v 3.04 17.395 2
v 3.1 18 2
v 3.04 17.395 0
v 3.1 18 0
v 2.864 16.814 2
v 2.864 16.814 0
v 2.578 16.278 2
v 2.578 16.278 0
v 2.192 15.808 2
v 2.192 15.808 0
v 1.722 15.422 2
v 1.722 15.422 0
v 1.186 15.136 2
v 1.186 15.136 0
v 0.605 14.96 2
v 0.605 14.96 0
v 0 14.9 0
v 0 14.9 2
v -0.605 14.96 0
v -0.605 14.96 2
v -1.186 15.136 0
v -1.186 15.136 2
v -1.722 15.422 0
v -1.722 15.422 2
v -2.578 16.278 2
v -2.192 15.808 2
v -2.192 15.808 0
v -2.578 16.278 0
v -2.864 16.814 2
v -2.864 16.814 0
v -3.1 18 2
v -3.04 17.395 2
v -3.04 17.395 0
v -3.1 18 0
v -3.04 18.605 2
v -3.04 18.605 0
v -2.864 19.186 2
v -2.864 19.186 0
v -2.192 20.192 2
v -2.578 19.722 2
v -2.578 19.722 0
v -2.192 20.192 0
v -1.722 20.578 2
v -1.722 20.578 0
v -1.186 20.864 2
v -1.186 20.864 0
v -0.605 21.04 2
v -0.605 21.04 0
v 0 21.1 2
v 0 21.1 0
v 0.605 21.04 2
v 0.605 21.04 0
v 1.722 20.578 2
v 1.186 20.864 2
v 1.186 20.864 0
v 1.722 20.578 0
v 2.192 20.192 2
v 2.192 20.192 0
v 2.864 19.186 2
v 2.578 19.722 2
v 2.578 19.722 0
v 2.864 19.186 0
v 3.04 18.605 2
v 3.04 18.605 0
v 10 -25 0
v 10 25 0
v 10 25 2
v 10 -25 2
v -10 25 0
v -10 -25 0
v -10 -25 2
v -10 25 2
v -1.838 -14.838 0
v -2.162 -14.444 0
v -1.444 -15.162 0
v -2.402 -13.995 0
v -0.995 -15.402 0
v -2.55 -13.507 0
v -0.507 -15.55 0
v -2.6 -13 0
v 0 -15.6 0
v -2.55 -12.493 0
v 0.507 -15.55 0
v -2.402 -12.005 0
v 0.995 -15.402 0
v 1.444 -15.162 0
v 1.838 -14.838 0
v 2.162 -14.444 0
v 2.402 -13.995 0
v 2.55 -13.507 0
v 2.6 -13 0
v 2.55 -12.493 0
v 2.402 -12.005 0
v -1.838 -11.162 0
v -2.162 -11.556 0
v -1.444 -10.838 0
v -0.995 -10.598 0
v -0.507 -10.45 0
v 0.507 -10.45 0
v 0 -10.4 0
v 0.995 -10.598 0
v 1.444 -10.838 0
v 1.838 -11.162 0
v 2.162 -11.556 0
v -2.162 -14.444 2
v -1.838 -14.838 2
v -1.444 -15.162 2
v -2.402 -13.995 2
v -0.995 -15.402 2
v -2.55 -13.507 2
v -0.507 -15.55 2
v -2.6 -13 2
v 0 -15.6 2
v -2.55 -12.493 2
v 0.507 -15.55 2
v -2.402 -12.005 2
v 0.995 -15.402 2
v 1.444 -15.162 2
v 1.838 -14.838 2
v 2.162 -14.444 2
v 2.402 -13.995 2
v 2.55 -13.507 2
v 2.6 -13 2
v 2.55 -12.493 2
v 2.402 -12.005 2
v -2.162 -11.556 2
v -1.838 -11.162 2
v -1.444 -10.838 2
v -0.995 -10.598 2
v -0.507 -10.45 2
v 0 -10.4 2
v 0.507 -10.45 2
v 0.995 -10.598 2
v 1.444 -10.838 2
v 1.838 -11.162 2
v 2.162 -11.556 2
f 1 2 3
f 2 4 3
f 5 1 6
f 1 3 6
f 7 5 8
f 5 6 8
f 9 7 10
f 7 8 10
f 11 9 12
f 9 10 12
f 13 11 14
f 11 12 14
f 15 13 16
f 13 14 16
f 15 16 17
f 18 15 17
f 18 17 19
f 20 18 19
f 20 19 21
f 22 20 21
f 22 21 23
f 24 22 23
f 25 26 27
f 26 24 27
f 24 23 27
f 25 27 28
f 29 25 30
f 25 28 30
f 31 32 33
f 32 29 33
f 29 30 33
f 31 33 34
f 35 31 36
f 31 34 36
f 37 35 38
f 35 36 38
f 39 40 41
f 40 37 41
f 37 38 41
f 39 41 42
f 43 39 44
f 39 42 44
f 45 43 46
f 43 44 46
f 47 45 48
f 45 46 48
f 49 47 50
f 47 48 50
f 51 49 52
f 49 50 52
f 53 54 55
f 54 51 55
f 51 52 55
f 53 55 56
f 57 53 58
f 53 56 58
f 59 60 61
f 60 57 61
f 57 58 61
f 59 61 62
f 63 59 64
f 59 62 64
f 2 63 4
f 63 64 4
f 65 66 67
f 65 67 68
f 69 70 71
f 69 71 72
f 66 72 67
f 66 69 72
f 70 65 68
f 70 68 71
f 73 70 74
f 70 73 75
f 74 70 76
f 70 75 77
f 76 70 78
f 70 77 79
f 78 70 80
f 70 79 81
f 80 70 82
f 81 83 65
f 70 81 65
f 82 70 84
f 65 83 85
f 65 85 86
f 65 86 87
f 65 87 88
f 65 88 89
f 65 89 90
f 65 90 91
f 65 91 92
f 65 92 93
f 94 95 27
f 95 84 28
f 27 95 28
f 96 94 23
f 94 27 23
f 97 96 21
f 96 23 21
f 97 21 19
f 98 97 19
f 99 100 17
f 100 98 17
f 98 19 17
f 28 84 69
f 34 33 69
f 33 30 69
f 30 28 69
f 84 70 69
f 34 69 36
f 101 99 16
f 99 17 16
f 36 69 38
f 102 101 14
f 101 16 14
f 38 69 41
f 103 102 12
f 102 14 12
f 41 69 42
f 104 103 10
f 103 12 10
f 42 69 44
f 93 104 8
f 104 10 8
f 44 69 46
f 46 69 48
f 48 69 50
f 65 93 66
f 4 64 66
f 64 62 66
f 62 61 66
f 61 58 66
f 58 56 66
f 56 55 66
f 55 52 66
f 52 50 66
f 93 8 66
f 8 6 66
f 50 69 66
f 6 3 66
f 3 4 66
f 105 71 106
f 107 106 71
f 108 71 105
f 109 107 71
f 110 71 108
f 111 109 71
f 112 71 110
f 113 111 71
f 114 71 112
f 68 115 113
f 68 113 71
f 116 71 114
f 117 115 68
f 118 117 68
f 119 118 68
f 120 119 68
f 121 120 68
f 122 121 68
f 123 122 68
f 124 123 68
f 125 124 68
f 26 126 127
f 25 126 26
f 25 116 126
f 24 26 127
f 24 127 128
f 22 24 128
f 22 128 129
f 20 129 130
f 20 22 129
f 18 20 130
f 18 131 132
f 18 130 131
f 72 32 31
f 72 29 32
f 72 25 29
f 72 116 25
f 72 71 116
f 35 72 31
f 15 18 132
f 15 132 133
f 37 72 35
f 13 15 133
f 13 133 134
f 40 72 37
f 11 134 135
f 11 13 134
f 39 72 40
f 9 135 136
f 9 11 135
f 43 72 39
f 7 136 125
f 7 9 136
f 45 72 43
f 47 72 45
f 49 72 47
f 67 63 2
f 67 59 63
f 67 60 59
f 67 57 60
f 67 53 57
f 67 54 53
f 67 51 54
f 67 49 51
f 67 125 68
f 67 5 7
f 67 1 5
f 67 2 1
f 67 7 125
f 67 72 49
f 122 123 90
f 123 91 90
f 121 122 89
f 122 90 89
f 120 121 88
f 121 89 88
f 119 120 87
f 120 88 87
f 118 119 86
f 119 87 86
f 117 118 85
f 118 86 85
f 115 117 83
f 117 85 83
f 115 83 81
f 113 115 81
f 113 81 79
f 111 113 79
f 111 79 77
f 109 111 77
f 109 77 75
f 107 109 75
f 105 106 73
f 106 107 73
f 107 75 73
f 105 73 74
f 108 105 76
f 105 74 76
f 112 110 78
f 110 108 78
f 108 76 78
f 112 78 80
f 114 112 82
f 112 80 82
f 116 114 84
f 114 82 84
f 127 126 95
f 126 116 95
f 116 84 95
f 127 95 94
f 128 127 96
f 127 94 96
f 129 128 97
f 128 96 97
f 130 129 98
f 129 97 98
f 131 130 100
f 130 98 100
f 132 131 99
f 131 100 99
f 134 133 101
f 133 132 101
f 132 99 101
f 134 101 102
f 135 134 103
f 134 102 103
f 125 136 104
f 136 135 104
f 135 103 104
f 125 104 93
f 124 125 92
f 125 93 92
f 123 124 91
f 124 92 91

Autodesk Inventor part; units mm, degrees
ref_plane "YZ Plane" through (0, 0, 0) normal (1, 0, 0) x (0, 1, 0)
ref_plane "XZ Plane" through (0, 0, 0) normal (0, 1, 0) x (-1, 0, 0)
ref_plane "XY Plane" through (0, 0, 0) normal (0, 0, 1) x (1, 0, 0)
sketch "Sketch1" plane through (0, 0, 0) normal (0, 0, 1) x (1, 0, 0)
  line L0 (-10, 25) -> (10, 25)
  line L1 (10, 25) -> (10, -25)
  line L2 (10, -25) -> (-10, -25)
  line L3 (-10, -25) -> (-10, 25)
  circle A0 centre (0, -13) radius 2.6
  circle A1 centre (0, 18) radius 3.1
  point P0 (0, 0)
  dimension "d0" = 20
  dimension "d1" = 50
  dimension "d2" = 5.2
  dimension "d3" = 6.2
extrude "Extrusion1" add sketch "Sketch1" along normal blind 2
properties part number "Bed Plate Hang"
